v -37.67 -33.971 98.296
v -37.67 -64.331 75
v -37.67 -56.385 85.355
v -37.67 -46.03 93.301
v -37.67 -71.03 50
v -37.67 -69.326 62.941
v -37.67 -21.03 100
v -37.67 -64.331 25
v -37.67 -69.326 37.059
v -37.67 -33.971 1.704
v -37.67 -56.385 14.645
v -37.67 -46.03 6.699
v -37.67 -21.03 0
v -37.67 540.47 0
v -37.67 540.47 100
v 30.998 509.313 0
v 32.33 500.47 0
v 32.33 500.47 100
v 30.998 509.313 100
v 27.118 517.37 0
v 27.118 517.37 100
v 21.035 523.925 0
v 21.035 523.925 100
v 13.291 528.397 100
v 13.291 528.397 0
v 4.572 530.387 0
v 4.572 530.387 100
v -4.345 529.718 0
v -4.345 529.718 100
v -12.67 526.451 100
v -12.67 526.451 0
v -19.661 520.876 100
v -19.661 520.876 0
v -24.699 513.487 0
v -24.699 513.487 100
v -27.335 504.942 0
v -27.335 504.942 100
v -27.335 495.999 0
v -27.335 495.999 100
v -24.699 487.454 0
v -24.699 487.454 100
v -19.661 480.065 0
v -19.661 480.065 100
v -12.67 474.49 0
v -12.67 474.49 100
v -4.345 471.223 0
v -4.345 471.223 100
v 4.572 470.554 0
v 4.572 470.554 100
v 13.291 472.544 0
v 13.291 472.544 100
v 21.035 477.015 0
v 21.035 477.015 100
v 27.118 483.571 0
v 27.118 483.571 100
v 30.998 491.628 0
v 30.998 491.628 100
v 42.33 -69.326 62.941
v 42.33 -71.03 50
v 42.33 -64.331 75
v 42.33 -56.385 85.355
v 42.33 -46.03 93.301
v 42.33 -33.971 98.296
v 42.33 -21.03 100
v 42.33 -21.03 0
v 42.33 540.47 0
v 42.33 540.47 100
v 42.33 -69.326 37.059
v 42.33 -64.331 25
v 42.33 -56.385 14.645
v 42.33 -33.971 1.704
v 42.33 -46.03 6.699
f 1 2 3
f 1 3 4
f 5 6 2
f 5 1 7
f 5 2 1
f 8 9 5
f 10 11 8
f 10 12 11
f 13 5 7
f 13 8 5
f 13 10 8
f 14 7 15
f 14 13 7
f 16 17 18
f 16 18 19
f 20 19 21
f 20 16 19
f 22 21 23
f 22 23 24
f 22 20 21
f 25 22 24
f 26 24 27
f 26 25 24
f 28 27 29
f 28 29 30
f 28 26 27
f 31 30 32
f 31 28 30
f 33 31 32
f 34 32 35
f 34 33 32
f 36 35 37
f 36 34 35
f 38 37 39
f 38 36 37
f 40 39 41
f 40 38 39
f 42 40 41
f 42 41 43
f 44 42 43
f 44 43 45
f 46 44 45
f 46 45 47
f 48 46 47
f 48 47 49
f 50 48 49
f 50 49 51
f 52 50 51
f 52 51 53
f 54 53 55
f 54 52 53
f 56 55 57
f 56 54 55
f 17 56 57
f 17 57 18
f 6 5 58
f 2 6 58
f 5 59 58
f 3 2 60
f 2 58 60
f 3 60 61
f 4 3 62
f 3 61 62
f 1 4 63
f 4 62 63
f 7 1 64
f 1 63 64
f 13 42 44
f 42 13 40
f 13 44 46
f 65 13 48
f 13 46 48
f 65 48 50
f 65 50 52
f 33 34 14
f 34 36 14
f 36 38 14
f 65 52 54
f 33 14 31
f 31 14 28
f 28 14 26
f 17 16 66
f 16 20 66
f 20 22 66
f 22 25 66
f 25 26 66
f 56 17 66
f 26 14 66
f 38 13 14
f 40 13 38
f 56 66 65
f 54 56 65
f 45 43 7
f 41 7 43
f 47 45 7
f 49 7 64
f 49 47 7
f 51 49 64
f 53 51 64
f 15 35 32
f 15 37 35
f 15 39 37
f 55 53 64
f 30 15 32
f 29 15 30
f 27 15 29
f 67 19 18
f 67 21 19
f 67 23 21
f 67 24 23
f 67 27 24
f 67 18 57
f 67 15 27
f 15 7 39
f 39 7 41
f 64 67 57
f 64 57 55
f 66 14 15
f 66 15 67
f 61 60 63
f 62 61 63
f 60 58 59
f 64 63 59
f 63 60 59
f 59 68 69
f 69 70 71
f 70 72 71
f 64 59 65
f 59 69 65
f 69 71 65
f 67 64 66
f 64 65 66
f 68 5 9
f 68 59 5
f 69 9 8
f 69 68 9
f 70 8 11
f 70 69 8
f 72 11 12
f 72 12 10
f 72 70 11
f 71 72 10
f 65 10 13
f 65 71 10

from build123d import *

# Parameters (mm, degrees)
SKETCH1_W           = 80
SKETCH1_H           = 611.5
SKETCH1_R           = 30
BOSS_EXTRUDE1_DEPTH = 100
FILLET2_R           = 50


with BuildPart() as part:
    # Sketch1 → Boss-Extrude1 (new body)
    with BuildSketch(Plane.XY):
        with Locations((2.330379174, 234.720418357)):
            Rectangle(SKETCH1_W, SKETCH1_H)
        with Locations((2.330379174, 500.470418357)):
            Circle(SKETCH1_R, mode=Mode.SUBTRACT)
    extrude(amount=BOSS_EXTRUDE1_DEPTH)

    # Fillet2
    fillet2_edges = [part.edges().sort_by_distance(p)[0] for p in [
        (2.330379174, -71.029581643, 0),
        (2.330379174, -71.029581643, 100),
    ]]
    fillet(fillet2_edges, radius=FILLET2_R - 0.0001)  # a hair under: the kernel refuses the full size


solid = part.part
